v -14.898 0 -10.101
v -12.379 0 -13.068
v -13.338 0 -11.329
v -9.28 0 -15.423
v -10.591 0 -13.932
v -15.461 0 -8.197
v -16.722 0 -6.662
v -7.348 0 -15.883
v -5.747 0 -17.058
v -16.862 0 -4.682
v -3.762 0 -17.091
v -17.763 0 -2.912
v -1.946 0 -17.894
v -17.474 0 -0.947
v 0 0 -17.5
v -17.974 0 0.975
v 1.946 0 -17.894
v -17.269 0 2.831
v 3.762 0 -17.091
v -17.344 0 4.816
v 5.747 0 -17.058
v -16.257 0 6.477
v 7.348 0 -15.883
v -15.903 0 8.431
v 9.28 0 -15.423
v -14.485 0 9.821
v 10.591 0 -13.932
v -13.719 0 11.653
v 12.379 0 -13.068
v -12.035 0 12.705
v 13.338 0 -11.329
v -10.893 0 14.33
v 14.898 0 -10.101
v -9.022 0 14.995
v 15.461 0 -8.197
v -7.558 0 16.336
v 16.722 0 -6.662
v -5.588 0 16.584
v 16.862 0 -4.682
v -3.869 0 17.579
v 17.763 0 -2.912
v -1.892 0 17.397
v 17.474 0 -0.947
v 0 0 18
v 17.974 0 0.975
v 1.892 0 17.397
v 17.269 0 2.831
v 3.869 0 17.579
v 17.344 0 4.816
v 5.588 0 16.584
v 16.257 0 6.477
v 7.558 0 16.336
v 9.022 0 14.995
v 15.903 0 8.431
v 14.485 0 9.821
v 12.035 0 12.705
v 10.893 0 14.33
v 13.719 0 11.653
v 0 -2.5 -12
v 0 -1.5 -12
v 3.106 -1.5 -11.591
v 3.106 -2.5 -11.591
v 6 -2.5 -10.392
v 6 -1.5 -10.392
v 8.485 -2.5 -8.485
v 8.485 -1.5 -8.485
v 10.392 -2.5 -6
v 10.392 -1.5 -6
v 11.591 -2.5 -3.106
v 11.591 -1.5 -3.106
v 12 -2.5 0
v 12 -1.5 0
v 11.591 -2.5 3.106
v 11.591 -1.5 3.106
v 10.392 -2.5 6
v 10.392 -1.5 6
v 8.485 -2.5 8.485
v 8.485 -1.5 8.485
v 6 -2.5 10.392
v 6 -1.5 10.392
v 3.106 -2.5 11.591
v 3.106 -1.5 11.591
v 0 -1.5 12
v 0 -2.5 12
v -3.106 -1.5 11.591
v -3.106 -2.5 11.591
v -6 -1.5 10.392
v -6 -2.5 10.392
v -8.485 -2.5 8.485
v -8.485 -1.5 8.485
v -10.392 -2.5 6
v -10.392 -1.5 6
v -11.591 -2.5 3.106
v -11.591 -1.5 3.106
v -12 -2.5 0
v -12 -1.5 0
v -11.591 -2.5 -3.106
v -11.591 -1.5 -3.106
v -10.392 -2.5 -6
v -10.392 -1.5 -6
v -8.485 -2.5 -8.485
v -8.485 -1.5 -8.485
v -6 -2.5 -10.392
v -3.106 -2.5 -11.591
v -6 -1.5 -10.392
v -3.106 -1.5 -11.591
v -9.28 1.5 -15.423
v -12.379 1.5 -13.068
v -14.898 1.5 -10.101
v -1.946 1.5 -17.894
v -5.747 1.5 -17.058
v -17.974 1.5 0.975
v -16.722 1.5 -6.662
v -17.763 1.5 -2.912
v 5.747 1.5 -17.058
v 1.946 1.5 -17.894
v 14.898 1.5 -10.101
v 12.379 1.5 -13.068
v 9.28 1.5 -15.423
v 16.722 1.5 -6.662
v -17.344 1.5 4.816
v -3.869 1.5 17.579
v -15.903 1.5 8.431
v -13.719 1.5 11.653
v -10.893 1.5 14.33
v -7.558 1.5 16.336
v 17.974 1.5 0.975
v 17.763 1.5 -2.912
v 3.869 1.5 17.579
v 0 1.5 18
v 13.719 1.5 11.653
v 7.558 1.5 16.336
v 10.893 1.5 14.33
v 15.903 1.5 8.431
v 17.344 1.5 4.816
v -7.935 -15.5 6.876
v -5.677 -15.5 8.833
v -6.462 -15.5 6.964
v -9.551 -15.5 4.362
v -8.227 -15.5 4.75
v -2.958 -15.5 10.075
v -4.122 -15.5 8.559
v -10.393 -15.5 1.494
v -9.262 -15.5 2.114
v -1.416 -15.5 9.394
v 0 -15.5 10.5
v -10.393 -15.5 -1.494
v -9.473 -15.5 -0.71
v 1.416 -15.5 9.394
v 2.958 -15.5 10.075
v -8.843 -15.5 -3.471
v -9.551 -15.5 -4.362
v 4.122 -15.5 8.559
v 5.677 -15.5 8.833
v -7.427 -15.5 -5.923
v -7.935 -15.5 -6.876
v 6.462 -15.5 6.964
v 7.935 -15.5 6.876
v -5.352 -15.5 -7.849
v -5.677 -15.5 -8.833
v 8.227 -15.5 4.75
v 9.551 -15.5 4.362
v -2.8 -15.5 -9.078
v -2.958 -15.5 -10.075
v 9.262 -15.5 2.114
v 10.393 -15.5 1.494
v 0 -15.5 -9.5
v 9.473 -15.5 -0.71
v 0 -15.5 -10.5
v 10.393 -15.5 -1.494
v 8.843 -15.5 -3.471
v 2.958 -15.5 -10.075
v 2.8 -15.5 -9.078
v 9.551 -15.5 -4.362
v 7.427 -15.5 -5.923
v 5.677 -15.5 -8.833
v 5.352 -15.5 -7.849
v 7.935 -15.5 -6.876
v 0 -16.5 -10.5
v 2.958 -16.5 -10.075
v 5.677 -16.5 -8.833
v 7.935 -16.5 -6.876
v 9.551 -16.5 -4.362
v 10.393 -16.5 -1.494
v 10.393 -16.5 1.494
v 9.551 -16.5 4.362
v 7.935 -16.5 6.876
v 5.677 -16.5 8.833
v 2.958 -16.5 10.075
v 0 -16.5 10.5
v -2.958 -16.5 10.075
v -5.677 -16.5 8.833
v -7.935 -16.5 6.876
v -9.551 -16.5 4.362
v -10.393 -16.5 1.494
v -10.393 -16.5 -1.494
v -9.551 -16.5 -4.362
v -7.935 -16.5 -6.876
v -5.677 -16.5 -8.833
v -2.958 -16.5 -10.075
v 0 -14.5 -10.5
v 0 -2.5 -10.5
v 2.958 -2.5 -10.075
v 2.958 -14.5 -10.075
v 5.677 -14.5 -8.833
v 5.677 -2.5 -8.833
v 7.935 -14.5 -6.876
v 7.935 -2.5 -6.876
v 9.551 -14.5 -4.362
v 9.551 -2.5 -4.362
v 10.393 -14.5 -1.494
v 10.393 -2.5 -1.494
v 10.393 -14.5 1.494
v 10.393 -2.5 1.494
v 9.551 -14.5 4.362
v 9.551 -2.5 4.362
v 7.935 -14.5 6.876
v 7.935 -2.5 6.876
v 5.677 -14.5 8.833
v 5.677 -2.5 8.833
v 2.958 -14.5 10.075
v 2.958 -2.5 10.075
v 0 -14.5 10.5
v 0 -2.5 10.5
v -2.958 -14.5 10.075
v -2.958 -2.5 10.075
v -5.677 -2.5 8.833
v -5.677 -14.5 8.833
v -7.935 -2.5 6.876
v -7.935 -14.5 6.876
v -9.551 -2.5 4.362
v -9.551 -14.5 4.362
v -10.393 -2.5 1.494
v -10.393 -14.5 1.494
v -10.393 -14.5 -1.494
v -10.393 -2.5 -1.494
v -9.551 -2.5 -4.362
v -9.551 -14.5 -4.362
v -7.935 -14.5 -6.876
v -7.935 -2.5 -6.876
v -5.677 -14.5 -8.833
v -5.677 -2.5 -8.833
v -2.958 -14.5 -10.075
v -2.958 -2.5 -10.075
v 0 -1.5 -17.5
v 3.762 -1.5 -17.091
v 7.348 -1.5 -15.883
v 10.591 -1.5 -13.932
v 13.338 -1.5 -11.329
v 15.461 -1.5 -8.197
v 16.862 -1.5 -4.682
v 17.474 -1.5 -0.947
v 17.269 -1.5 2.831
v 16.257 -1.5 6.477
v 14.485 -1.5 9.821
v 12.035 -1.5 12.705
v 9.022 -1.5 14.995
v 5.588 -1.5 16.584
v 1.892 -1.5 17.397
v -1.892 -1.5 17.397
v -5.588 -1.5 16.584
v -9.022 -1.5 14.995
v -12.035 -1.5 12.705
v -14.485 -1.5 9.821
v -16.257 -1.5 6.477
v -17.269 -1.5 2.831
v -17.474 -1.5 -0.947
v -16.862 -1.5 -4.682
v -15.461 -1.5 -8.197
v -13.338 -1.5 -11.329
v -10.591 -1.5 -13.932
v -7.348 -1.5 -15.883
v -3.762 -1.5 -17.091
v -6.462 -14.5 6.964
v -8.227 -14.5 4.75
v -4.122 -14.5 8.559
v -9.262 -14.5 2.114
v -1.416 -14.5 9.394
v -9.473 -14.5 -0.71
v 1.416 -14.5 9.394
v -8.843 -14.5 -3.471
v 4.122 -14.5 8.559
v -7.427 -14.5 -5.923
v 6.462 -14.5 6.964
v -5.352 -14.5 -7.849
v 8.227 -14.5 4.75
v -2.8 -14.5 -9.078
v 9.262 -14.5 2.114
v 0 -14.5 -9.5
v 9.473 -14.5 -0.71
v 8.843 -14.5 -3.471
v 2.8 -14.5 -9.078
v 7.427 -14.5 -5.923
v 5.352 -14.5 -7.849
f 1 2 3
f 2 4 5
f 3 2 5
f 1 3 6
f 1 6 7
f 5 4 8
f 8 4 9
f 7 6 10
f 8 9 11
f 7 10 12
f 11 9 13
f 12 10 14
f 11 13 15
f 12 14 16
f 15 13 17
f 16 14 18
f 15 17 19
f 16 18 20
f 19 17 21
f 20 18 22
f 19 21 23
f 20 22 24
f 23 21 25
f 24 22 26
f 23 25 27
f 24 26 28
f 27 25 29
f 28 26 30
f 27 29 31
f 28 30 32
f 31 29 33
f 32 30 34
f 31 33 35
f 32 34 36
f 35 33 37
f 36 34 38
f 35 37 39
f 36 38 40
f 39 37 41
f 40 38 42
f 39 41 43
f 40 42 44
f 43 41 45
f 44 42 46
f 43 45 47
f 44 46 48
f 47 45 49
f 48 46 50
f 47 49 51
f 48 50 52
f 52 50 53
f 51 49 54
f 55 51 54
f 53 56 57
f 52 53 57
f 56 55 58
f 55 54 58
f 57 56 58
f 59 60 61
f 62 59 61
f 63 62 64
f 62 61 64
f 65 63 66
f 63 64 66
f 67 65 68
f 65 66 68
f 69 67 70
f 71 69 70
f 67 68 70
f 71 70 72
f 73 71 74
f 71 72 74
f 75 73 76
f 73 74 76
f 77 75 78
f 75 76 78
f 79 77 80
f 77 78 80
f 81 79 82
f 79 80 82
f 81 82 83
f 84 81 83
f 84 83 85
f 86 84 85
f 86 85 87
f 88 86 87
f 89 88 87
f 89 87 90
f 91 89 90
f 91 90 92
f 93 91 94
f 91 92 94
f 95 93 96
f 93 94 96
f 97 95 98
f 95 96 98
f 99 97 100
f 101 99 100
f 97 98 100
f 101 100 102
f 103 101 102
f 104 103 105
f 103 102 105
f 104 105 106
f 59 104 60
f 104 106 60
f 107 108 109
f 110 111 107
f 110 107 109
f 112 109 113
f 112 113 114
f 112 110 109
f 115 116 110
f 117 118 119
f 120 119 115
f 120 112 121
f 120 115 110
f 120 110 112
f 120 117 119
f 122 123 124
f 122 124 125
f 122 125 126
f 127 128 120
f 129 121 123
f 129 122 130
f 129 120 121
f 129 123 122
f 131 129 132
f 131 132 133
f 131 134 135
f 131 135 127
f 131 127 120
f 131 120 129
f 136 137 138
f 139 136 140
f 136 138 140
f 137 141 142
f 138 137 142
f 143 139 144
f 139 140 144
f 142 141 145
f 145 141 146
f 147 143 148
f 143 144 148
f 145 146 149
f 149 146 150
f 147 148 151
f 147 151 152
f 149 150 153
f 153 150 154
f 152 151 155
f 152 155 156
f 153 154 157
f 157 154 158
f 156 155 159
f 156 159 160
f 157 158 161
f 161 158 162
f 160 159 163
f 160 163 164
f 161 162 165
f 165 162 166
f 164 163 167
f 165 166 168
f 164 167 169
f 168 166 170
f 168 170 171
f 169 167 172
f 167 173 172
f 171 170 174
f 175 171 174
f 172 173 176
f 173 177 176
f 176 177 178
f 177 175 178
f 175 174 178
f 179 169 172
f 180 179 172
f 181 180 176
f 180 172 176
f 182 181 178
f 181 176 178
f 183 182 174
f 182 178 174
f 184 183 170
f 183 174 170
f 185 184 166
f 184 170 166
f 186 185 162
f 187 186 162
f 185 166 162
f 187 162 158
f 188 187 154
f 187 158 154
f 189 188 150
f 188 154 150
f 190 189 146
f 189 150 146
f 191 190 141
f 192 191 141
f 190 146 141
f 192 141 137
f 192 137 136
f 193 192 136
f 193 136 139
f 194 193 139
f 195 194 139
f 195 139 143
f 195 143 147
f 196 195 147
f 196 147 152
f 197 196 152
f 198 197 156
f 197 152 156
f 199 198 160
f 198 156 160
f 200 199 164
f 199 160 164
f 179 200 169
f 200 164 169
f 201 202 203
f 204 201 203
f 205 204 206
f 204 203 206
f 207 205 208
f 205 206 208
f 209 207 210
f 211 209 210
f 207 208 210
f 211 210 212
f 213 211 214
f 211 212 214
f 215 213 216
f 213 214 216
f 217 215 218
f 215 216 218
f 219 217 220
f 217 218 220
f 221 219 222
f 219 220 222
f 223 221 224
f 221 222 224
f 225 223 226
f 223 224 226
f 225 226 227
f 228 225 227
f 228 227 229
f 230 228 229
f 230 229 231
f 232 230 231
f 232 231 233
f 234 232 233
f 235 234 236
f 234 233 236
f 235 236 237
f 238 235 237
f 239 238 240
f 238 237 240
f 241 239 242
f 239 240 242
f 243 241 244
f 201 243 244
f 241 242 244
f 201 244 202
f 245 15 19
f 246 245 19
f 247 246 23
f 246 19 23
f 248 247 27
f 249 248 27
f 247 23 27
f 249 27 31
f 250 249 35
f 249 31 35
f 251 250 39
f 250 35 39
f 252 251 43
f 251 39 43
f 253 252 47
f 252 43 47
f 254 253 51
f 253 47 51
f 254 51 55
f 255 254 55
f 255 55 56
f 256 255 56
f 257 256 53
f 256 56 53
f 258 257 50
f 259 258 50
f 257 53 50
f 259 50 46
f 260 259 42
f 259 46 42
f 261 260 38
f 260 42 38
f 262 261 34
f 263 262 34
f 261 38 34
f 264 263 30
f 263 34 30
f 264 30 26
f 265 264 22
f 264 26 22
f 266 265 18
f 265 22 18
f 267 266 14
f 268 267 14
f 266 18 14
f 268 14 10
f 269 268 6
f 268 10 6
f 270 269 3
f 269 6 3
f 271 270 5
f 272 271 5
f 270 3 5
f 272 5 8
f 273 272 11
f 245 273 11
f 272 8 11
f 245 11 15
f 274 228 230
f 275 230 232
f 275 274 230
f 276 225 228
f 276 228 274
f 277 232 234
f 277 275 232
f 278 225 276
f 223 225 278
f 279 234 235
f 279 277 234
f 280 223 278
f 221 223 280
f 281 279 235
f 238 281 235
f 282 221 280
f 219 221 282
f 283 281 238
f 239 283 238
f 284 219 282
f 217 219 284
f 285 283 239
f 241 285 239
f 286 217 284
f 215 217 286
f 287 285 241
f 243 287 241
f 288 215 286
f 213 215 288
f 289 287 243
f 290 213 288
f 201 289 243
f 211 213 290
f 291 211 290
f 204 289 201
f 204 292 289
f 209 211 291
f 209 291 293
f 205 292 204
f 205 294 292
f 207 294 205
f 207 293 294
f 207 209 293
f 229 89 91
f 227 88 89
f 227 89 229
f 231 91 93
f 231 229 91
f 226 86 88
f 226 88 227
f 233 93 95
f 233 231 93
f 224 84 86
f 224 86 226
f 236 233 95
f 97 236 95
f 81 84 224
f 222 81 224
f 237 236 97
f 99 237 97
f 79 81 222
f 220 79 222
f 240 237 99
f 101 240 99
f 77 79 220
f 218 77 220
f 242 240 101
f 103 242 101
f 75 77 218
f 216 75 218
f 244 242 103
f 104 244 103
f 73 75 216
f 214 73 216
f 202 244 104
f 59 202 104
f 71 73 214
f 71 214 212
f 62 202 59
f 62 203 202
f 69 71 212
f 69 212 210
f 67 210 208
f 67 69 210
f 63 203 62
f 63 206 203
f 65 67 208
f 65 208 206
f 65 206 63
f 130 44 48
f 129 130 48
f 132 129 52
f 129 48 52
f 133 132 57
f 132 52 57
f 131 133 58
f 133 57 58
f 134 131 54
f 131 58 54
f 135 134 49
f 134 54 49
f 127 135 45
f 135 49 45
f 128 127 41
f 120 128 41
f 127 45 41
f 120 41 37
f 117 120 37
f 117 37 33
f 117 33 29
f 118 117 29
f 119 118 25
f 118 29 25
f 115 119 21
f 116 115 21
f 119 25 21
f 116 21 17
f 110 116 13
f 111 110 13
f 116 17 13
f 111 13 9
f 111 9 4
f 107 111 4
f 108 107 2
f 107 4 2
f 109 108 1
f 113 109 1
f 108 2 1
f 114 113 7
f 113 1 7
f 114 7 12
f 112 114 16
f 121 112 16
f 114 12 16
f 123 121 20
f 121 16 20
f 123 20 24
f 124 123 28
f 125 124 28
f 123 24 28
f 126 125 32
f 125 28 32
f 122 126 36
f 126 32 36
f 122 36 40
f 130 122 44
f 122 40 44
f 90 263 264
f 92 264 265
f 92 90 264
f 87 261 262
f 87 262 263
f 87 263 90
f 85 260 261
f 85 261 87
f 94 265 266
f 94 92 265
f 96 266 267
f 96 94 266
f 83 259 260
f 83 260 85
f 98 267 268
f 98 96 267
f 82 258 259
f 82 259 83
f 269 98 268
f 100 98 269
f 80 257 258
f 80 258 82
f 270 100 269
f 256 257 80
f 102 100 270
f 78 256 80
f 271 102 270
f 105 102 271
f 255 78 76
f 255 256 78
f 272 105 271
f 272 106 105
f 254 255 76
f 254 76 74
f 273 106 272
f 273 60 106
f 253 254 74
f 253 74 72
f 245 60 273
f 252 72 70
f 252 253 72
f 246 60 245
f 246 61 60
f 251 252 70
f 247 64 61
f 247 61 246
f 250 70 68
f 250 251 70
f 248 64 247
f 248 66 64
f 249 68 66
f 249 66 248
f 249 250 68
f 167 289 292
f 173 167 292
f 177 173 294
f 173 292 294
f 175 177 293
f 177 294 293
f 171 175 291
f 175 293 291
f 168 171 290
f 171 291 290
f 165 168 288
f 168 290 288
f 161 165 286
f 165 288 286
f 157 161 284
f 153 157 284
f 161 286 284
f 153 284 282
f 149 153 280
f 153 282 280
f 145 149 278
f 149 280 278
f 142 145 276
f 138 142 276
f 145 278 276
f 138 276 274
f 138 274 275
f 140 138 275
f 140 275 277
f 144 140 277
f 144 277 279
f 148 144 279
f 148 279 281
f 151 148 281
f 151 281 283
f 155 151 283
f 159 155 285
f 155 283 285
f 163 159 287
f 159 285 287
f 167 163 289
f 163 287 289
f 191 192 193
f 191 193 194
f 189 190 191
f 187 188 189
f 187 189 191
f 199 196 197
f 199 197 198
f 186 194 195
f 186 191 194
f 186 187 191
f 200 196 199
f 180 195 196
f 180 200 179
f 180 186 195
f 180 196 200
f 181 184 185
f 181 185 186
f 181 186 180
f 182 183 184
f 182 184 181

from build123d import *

# Parameters (mm, degrees)
SKETCH1_R           = 18
BOSS_EXTRUDE1_DEPTH = 1.5
SKETCH2_R           = 17.5
BOSS_EXTRUDE2_DEPTH = 1.5
SKETCH3_R           = 12
BOSS_EXTRUDE3_DEPTH = 1
SKETCH4_R           = 10.5
BOSS_EXTRUDE4_DEPTH = 12
SKETCH5_R           = 9.5
BOSS_EXTRUDE5_DEPTH = 1
SKETCH6_R           = 10.5
BOSS_EXTRUDE6_DEPTH = 1


with BuildPart() as part:
    # Sketch1 → Boss-Extrude1 (new body)
    with BuildSketch(Plane(origin=(0, 0, 0), x_dir=(1, 0, 0), z_dir=(0, 1, 0))):
        with Locations(Location((0, 0, 0), (0, 0, 270))):
            Circle(SKETCH1_R)
    extrude(amount=BOSS_EXTRUDE1_DEPTH)

    # Sketch2 → Boss-Extrude2 (add)
    with BuildSketch(Plane.XZ):
        with Locations(Location((0, 0, 0), (0, 0, 270))):
            Circle(SKETCH2_R)
    extrude(amount=BOSS_EXTRUDE2_DEPTH)

    # Sketch3 → Boss-Extrude3 (add)
    with BuildSketch(Plane.XZ.offset(1.5)):
        with Locations(Location((0, 0, 0), (0, 0, 270))):
            Circle(SKETCH3_R)
    extrude(amount=BOSS_EXTRUDE3_DEPTH)

    # Sketch4 → Boss-Extrude4 (add)
    with BuildSketch(Plane.XZ.offset(2.5)):
        with Locations(Location((0, 0, 0), (0, 0, 270))):
            Circle(SKETCH4_R)
    extrude(amount=BOSS_EXTRUDE4_DEPTH)

    # Sketch5 → Boss-Extrude5 (add)
    with BuildSketch(Plane.XZ.offset(14.5)):
        with Locations(Location((0, 0, 0), (0, 0, 270))):
            Circle(SKETCH5_R)
    extrude(amount=BOSS_EXTRUDE5_DEPTH)

    # Sketch6 → Boss-Extrude6 (add)
    with BuildSketch(Plane.XZ.offset(15.5)):
        with Locations(Location((0, 0, 0), (0, 0, 270))):
            Circle(SKETCH6_R)
    extrude(amount=BOSS_EXTRUDE6_DEPTH)


solid = part.part
